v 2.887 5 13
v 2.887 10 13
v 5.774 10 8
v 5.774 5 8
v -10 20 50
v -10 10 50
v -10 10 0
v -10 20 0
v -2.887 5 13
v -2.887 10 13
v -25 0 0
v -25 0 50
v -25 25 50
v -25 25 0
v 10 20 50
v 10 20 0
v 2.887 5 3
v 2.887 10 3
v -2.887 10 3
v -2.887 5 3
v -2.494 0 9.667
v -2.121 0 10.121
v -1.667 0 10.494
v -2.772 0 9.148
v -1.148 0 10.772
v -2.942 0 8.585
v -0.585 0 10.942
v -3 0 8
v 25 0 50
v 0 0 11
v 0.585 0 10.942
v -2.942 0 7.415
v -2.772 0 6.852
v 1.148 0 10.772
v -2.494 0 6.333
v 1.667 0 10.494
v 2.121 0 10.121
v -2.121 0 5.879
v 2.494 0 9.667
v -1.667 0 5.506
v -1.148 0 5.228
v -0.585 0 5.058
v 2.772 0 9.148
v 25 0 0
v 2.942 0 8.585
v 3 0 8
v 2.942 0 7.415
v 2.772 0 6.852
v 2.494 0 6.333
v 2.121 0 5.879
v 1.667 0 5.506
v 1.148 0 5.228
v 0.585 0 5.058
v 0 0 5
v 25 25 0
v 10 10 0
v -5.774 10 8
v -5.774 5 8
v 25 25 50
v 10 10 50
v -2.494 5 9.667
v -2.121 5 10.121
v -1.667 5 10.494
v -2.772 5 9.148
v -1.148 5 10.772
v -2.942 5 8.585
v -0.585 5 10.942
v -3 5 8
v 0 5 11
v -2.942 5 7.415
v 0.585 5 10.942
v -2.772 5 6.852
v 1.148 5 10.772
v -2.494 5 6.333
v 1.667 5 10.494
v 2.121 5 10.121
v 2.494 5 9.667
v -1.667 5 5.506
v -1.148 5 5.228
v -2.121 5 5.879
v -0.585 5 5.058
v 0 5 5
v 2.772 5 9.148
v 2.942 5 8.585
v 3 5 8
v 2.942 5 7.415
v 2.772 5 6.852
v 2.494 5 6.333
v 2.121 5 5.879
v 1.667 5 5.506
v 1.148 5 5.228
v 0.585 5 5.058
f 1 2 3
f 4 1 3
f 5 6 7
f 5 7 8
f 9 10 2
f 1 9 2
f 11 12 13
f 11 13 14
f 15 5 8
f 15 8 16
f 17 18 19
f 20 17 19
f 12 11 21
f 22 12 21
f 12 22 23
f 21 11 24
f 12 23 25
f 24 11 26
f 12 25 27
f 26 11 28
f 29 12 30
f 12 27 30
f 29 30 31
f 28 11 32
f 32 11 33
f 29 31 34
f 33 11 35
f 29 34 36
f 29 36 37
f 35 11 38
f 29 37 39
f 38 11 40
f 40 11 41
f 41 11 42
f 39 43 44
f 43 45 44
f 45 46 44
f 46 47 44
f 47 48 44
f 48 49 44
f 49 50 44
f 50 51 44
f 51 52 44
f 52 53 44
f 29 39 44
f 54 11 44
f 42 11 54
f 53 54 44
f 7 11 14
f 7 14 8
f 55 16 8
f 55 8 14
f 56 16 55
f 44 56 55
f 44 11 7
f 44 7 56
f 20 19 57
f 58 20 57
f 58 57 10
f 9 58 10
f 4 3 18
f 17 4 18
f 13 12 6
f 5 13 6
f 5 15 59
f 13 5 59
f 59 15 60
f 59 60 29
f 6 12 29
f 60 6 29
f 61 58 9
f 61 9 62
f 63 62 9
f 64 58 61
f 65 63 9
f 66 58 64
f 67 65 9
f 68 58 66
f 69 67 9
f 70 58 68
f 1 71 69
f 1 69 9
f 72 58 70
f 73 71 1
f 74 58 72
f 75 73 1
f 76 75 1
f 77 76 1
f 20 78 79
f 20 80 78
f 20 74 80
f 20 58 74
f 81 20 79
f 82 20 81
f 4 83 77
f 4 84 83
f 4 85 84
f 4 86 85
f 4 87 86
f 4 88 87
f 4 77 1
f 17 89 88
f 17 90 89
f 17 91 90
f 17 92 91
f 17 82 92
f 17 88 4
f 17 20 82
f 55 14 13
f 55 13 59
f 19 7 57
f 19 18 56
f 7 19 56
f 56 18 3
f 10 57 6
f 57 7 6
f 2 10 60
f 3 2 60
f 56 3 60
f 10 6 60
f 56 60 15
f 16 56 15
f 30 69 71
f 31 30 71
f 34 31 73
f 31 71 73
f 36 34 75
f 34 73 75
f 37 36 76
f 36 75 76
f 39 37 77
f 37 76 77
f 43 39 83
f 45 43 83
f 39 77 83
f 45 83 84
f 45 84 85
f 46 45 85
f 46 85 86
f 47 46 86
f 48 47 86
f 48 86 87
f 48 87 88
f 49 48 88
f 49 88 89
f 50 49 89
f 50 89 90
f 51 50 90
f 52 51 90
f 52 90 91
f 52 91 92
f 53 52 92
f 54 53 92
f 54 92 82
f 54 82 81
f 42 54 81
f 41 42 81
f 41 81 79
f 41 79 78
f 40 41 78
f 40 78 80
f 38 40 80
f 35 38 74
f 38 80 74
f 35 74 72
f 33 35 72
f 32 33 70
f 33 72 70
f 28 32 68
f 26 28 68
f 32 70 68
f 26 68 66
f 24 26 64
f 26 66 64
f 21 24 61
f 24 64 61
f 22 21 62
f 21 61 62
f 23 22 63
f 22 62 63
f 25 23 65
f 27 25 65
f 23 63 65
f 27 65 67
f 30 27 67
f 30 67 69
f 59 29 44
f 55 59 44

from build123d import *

# Parameters (mm, degrees)
SKETCH1_W           = 50
SKETCH1_H           = 50
BOSS_EXTRUDE1_DEPTH = 25
SKETCH2_W           = 20
SKETCH2_H           = 10
CUT_EXTRUDE1_DEPTH  = 50
SKETCH3_R           = 3
CUT_EXTRUDE2_DEPTH  = 10
CUT_EXTRUDE3_DEPTH  = 5


with BuildPart() as part:
    # Sketch1 → Boss-Extrude1 (new body)
    with BuildSketch(Plane(origin=(0, 0, 0), x_dir=(1, 0, 0), z_dir=(0, 1, 0))):
        with Locations((0, -25)):
            Rectangle(SKETCH1_W, SKETCH1_H)
    extrude(amount=BOSS_EXTRUDE1_DEPTH)

    # Sketch2 → Cut-Extrude1 (cut)
    with BuildSketch(Plane.XY.offset(50)):
        with Locations((0, 15)):
            Rectangle(SKETCH2_W, SKETCH2_H)
    extrude(amount=-CUT_EXTRUDE1_DEPTH, mode=Mode.SUBTRACT)

    # Sketch3 → Cut-Extrude2 (cut)
    with BuildSketch(Plane(origin=(0, 10, 0), x_dir=(1, 0, 0), z_dir=(0, 1, 0))):
        with Locations(Location((0, -8, 0), (0, 0, 270))):
            Circle(SKETCH3_R)
    extrude(amount=-CUT_EXTRUDE2_DEPTH, mode=Mode.SUBTRACT)

    # Sketch4 → Cut-Extrude3 (cut)
    with BuildSketch(Plane(origin=(0, 10, 0), x_dir=(1, 0, 0), z_dir=(0, 1, 0))):
        Polygon((2.886751346, -3), (-2.886751346, -3), (-5.773502692, -8), (-2.886751346, -13), (2.886751346, -13), (5.773502692, -8), align=None)
    extrude(amount=-CUT_EXTRUDE3_DEPTH, mode=Mode.SUBTRACT)


solid = part.part
